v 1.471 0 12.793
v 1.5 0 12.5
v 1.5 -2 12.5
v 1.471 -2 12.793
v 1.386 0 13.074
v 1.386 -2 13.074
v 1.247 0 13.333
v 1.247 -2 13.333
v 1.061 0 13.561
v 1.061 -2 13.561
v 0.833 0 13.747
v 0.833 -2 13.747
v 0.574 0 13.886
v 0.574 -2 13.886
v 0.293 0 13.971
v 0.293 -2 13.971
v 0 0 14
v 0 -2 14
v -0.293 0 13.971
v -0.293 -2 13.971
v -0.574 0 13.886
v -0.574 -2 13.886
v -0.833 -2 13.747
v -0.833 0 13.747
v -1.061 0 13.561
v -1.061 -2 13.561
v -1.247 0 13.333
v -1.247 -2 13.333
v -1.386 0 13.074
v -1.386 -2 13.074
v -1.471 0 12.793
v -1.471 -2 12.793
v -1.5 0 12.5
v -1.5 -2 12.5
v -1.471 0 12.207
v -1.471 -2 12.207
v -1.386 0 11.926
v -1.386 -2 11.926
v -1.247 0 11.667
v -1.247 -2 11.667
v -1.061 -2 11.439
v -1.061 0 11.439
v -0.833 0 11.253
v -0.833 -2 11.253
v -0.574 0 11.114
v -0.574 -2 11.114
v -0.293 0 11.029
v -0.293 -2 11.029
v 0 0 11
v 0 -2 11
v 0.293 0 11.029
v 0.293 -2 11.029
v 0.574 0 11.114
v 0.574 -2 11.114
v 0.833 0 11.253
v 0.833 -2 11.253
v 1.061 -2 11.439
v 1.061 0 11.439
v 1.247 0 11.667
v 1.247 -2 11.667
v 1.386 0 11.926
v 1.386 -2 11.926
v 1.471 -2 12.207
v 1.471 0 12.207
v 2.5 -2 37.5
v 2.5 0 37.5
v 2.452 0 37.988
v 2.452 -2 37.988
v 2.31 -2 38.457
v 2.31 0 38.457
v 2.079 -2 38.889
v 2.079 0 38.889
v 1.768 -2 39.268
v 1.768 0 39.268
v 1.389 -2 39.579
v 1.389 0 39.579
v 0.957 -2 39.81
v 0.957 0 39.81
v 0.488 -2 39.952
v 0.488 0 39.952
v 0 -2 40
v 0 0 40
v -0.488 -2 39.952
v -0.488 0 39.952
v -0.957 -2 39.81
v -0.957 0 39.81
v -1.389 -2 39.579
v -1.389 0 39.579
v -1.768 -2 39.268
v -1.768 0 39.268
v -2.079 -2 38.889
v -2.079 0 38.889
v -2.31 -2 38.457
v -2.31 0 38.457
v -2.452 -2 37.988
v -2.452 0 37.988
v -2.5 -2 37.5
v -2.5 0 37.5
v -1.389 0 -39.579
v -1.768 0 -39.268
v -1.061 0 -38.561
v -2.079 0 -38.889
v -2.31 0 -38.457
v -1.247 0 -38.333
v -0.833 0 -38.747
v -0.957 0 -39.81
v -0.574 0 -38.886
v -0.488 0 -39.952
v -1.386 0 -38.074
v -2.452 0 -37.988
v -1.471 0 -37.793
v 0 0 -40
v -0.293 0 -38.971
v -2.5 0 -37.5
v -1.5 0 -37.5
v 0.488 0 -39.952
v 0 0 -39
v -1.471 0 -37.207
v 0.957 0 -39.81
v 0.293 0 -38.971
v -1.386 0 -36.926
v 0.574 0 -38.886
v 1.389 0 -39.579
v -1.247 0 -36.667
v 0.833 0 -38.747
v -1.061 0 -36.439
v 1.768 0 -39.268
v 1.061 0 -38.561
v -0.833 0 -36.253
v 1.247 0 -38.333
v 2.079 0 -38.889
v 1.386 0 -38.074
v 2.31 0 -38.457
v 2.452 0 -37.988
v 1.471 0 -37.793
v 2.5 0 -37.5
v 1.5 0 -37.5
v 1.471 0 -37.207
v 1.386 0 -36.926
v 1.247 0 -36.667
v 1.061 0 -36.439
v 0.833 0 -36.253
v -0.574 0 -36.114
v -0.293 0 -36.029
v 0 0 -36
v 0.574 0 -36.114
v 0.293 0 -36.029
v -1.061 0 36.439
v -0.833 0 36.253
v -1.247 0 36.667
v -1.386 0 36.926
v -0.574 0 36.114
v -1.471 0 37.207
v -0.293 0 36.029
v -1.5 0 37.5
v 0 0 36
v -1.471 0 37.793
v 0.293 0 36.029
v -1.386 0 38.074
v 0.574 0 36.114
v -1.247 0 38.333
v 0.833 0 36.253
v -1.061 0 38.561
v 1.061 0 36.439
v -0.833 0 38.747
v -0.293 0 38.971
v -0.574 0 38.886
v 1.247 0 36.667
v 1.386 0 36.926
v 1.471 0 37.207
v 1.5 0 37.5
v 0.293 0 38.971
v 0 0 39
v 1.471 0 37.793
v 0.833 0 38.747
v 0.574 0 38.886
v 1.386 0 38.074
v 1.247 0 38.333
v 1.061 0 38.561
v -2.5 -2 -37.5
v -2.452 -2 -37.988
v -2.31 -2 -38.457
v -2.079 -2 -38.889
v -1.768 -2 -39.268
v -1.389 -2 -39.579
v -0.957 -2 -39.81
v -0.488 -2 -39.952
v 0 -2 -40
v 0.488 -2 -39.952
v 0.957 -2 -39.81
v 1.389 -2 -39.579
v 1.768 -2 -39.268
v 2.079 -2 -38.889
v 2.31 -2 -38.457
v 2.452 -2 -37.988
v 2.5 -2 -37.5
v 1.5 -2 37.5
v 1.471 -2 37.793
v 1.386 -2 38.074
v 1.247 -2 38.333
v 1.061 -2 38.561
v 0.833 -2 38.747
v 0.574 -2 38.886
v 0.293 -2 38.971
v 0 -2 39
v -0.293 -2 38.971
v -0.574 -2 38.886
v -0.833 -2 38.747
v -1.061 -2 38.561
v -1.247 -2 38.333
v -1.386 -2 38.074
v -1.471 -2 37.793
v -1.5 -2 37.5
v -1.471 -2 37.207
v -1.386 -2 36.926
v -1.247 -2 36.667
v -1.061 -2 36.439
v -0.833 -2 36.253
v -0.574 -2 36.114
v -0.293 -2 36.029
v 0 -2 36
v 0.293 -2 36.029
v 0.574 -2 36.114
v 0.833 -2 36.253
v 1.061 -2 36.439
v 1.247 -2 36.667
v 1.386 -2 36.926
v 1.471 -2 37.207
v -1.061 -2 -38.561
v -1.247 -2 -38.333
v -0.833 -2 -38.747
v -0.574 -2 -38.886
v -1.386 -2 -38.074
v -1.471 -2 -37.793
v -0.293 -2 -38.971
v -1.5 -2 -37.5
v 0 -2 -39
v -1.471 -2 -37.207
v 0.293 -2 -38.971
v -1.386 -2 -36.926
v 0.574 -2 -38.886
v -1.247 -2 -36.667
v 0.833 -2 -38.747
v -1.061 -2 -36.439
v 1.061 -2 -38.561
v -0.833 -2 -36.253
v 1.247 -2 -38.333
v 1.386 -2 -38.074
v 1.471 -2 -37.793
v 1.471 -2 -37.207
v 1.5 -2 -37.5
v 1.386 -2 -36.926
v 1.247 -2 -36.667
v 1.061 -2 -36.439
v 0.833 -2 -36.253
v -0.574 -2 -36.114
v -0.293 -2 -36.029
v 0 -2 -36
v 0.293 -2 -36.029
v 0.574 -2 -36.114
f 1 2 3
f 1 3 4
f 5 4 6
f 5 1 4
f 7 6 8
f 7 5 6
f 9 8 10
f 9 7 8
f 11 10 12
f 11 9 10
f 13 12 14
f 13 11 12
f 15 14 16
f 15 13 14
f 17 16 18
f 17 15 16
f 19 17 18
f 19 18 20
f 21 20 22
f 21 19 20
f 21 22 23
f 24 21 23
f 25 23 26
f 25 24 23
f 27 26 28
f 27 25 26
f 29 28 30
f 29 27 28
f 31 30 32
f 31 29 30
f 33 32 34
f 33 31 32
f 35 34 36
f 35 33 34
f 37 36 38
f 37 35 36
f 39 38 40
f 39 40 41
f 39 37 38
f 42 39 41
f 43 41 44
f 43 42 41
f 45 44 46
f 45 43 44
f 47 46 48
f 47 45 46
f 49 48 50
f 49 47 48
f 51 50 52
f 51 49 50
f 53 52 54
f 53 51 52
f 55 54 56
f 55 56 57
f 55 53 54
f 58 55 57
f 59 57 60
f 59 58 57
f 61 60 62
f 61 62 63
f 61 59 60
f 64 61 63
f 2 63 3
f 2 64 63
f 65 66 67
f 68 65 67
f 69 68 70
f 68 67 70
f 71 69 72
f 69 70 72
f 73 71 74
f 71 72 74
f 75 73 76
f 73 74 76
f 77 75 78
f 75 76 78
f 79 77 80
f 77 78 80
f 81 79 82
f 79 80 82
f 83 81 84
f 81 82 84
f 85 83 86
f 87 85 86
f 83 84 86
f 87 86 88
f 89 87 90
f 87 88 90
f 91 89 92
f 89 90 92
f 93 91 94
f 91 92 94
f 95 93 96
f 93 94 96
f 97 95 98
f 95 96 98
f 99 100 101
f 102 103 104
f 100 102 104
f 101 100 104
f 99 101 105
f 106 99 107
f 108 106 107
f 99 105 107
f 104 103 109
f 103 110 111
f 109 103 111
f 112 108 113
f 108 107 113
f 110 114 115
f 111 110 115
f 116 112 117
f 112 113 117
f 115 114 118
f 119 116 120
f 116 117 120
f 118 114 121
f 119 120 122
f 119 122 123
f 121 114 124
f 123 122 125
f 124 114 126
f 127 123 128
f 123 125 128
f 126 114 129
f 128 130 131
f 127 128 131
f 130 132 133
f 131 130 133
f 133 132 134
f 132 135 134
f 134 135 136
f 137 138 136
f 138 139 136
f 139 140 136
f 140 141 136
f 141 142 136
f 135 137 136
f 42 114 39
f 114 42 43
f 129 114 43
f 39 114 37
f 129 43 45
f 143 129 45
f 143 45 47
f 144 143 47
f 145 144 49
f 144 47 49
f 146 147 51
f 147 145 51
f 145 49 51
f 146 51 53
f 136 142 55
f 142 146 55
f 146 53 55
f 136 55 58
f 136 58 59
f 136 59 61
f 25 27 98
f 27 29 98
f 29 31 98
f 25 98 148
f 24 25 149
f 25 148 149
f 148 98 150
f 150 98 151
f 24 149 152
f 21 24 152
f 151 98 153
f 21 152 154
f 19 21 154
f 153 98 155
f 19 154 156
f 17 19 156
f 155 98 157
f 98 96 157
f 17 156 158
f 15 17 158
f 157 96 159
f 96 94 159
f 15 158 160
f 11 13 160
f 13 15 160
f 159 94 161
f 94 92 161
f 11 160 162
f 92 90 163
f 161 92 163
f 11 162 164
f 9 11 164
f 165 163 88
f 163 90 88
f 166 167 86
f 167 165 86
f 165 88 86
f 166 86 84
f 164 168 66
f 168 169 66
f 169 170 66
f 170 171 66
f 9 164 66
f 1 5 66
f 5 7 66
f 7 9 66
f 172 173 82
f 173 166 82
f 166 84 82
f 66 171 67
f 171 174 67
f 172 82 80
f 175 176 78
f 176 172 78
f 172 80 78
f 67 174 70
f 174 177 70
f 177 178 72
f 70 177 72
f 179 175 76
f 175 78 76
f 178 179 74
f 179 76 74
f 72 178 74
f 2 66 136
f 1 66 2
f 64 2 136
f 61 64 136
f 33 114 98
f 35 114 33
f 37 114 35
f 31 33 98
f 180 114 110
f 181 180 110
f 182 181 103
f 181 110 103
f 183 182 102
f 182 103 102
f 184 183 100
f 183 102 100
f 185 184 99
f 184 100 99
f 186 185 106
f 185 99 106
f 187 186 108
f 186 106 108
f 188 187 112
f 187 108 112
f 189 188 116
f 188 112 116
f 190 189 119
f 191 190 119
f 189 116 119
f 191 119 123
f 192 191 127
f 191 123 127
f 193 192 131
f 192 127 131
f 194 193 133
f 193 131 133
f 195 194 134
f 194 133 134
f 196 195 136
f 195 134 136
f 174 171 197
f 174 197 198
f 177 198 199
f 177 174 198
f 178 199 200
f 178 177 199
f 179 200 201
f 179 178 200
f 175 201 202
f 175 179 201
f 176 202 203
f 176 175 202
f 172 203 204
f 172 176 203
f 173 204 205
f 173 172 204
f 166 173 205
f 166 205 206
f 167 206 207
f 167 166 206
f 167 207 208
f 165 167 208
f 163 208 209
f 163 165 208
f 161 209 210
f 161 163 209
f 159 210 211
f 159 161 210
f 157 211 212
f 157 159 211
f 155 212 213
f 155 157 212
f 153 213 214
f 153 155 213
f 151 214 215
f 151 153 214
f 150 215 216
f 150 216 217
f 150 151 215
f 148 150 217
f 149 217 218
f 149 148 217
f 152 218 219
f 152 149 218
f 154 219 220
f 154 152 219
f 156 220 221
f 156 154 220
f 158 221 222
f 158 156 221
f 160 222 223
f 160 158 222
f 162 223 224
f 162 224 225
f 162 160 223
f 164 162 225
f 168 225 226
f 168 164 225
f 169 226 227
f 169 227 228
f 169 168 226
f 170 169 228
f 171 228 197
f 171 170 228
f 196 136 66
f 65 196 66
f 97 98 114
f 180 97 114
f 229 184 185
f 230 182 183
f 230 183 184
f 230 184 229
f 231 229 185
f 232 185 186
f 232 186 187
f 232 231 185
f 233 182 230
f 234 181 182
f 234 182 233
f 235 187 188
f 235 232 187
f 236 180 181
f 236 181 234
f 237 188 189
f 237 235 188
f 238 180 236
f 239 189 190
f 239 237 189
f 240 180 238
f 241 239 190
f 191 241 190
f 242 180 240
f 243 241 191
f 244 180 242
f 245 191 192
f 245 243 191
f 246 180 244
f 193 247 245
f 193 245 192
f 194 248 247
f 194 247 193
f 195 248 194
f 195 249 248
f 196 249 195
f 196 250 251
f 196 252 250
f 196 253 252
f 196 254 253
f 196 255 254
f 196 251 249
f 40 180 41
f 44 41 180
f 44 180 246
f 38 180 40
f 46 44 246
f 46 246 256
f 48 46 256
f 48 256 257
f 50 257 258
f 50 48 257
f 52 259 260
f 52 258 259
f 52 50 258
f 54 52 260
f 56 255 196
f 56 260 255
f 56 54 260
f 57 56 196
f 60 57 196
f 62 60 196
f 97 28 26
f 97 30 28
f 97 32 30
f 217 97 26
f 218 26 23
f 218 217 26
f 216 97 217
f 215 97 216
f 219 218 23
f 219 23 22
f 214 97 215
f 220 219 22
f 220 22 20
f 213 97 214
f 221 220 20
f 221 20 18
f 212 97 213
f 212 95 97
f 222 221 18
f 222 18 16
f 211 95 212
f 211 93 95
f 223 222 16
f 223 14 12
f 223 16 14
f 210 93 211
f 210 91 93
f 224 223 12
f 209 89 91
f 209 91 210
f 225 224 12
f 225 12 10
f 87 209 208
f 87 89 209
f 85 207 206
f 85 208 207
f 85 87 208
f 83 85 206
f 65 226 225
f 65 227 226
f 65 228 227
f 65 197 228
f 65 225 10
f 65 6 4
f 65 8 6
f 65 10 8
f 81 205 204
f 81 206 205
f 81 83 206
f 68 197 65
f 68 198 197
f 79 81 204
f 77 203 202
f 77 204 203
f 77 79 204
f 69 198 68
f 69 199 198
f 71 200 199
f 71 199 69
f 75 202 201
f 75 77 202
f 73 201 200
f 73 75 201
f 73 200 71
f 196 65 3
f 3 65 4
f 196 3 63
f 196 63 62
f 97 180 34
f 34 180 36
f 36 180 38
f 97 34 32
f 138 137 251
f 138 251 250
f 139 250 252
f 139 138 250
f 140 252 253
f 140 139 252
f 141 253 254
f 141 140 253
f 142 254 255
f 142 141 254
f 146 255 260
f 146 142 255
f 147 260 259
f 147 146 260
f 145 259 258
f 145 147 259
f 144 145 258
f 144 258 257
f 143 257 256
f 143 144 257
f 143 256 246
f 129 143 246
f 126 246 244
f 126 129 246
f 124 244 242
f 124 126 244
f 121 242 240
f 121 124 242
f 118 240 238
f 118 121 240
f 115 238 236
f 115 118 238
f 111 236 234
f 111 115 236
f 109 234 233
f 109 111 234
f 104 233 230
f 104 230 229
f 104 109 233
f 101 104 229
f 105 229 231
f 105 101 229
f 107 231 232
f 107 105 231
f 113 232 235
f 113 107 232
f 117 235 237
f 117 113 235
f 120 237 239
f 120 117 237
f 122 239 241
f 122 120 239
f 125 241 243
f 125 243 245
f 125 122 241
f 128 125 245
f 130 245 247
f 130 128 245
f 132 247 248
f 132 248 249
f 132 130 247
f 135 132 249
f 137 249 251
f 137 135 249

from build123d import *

# Parameters (mm, degrees)
F0_R     = 1.5
F1_DEPTH = 2


with BuildPart() as f1:
    # F0 (on Front) → F1 (new body)
    with BuildSketch(Plane.XZ):
        with BuildLine():
            Line((2.5, -37.5), (2.5, 37.5))
            ThreePointArc((2.5, 37.5), (0, 40), (-2.5, 37.5))
            Line((-2.5, 37.5), (-2.5, -37.5))
            ThreePointArc((-2.5, -37.5), (0, -40), (2.5, -37.5))
        make_face()
        with Locations((0, -37.5)):
            Circle(F0_R, mode=Mode.SUBTRACT)
        with Locations((0, 12.5)):
            Circle(F0_R, mode=Mode.SUBTRACT)
        with Locations((0, 37.5)):
            Circle(F0_R, mode=Mode.SUBTRACT)
    extrude(amount=F1_DEPTH)


solid = f1.part
